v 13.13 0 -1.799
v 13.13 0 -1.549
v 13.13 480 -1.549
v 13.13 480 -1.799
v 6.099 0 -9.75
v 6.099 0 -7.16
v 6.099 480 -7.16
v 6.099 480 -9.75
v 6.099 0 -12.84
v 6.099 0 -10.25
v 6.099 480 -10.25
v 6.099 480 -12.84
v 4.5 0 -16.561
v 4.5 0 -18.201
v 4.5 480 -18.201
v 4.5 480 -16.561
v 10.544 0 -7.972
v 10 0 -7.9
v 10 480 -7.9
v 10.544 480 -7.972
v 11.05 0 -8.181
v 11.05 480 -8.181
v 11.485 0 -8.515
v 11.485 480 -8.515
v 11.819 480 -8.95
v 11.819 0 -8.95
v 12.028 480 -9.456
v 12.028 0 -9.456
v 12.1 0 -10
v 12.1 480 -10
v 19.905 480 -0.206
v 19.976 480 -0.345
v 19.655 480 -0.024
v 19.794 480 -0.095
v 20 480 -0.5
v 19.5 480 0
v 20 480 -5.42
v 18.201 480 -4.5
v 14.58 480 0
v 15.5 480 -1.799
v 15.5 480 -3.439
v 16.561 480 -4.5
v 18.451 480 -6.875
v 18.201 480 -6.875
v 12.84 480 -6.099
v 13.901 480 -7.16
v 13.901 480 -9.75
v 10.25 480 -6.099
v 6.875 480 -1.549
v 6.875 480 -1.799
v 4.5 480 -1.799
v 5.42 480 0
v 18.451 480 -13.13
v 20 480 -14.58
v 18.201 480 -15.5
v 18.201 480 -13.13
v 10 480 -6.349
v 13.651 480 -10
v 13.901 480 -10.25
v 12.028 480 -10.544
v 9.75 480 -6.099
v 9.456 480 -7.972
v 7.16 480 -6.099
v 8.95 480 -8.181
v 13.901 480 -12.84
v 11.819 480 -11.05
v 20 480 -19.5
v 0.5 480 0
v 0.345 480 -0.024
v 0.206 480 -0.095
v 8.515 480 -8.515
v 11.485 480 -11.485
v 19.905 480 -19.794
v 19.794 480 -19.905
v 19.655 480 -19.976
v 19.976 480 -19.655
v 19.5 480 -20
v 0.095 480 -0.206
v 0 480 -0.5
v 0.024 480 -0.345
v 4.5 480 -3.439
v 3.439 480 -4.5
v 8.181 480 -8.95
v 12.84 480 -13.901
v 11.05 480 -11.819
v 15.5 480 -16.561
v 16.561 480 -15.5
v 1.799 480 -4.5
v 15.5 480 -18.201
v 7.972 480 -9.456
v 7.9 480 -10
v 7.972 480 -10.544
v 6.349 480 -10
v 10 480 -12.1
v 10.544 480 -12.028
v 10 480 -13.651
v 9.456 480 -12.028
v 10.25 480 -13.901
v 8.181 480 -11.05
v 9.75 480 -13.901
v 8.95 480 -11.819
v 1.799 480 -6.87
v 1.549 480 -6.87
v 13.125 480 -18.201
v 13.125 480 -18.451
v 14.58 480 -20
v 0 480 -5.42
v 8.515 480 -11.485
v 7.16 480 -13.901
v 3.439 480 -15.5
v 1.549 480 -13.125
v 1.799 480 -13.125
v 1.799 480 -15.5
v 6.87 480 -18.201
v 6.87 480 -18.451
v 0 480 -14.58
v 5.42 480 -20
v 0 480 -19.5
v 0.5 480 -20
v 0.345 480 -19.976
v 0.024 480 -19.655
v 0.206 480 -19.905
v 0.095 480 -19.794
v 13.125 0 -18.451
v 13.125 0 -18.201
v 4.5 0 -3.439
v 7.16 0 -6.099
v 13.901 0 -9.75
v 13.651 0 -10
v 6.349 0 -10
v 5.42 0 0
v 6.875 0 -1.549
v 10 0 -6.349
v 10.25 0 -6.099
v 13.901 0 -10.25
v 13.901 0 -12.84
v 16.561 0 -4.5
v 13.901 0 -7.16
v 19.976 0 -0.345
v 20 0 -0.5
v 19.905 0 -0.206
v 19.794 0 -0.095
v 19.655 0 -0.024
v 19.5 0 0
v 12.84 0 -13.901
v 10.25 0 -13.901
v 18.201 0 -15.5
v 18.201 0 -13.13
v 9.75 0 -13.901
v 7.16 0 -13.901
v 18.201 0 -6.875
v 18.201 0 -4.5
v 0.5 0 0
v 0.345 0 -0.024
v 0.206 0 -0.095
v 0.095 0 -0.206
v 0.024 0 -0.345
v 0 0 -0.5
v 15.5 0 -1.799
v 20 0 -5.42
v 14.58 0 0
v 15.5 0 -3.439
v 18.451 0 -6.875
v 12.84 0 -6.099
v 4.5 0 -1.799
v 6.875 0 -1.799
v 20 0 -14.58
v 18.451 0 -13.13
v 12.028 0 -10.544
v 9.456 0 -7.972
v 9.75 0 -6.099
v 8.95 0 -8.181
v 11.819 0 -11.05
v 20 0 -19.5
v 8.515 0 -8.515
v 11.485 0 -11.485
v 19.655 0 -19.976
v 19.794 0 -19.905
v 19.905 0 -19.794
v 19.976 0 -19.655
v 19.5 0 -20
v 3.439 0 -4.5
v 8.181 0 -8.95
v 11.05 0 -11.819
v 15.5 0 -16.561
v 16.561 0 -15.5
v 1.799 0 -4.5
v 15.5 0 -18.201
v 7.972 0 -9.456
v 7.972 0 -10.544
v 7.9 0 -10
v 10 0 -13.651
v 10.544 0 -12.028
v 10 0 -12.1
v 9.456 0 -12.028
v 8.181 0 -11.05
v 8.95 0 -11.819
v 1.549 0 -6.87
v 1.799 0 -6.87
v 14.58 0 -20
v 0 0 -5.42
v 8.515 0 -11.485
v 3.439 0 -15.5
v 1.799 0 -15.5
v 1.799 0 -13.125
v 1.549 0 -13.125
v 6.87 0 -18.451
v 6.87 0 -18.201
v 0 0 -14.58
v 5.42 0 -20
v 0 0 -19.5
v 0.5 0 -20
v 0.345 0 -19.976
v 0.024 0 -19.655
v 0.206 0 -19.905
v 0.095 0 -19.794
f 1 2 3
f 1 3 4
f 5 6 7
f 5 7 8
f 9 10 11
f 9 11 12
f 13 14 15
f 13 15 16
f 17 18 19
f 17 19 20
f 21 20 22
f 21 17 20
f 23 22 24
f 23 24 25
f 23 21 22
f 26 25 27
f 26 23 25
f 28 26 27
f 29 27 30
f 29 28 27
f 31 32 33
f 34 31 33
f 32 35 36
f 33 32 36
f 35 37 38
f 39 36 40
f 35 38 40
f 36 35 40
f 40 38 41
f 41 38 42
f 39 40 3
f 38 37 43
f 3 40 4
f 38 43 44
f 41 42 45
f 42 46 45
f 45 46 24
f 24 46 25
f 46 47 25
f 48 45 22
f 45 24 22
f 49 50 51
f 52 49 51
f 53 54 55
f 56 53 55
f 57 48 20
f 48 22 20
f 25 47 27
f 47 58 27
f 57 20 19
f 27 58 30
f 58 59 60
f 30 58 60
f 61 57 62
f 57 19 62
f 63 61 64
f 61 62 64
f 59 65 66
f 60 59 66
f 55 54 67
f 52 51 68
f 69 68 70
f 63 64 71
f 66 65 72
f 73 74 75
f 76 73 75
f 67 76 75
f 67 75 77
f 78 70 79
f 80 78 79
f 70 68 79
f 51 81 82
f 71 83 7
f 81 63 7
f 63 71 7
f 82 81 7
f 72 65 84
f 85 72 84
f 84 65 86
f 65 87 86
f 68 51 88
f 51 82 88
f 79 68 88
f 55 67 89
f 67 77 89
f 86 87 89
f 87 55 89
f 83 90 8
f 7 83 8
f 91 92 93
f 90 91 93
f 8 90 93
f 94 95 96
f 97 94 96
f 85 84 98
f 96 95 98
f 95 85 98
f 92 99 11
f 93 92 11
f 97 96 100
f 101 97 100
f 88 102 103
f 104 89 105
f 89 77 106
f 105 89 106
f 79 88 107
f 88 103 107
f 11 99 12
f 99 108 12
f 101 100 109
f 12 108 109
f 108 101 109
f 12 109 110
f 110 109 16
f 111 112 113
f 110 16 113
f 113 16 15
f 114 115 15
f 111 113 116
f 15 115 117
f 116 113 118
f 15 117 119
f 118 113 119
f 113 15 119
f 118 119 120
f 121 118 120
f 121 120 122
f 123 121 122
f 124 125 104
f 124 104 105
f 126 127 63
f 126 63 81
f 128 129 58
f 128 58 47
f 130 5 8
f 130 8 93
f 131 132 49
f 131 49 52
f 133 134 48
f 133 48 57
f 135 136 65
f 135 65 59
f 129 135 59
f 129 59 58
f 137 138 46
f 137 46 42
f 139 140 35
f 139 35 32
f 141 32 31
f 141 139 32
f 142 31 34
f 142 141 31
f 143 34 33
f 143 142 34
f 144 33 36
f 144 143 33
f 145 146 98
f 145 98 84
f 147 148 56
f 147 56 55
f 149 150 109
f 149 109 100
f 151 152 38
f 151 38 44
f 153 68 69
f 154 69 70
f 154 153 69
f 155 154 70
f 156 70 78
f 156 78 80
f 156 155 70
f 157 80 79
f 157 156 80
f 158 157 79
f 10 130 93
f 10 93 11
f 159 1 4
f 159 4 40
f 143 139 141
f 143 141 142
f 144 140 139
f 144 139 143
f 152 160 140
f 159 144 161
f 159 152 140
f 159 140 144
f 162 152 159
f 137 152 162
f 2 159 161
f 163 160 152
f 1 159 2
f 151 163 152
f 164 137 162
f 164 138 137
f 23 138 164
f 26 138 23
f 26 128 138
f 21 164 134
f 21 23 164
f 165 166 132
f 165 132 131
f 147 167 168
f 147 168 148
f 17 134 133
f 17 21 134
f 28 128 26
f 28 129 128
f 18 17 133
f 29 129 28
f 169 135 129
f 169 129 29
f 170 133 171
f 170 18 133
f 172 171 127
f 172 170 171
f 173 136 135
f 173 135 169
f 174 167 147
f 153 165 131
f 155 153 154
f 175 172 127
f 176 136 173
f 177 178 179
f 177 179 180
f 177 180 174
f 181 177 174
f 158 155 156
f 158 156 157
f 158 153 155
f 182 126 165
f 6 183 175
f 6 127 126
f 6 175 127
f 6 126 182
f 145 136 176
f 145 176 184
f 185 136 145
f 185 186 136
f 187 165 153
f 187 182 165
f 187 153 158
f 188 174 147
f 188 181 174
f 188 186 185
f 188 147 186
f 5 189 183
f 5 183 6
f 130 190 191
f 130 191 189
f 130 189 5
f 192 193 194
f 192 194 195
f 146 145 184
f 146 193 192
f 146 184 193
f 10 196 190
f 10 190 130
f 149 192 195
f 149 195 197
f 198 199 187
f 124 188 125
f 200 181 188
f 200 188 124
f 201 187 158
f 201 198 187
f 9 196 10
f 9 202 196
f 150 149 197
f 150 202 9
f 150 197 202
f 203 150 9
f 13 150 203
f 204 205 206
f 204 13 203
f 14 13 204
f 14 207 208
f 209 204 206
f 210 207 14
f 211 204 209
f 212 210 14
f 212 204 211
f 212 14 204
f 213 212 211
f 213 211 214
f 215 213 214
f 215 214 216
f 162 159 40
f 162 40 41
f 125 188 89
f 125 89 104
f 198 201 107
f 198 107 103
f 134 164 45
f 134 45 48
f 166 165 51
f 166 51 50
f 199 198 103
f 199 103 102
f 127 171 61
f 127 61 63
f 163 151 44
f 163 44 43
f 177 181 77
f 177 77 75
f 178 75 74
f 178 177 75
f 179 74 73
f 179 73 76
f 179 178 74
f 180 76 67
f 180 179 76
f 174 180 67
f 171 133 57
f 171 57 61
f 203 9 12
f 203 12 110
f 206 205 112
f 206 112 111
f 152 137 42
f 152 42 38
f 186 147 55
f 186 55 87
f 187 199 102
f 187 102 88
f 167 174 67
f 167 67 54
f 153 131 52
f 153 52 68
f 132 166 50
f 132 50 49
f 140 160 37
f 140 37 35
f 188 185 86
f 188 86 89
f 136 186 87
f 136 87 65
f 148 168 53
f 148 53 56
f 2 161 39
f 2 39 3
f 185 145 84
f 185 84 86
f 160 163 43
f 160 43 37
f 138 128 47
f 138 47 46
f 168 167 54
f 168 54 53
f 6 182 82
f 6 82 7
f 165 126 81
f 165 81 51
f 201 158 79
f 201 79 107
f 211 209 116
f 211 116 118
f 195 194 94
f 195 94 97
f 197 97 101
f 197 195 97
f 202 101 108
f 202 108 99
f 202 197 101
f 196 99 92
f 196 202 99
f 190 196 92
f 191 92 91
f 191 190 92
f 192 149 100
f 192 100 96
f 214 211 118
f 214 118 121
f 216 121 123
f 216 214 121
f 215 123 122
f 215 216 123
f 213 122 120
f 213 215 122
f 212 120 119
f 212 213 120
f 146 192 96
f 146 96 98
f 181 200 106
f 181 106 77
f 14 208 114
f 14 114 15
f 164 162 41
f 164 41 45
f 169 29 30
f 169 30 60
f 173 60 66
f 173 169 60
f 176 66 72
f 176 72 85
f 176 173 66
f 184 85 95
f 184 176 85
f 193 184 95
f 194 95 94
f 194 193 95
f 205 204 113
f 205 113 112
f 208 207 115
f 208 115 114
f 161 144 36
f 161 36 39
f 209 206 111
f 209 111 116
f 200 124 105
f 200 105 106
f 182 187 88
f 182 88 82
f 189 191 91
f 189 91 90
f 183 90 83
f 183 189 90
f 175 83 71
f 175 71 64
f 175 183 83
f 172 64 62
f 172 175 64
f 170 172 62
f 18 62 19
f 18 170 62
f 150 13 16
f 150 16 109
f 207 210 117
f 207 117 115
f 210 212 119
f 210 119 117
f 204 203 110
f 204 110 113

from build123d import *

# Parameters (mm, degrees)
BOSS_EXTRUDE1_DEPTH = 480


with BuildPart() as part:
    # Sketch1 → Boss-Extrude1 (new body)
    with BuildSketch(Plane(origin=(0, 0, 0), x_dir=(1, 0, 0), z_dir=(0, 1, 0))):
        with BuildLine():
            Line((20, 5.42), (20, 0.5))
            ThreePointArc((20, 0.5), (19.853553391, 0.146446609), (19.5, 0))
            Line((19.5, 0), (14.58, 0))
            Line((14.58, 0), (13.13, 1.549339828))
            Line((13.13, 1.549339828), (13.13, 1.799339828))
            Line((13.13, 1.799339828), (15.5, 1.799339828))
            Line((15.5, 1.799339828), (15.5, 3.439339828))
            Line((15.5, 3.439339828), (12.84, 6.099339828))
            Line((12.84, 6.099339828), (10.25, 6.099339828))
            Line((10.25, 6.099339828), (10, 6.349339828))
            Line((10, 6.349339828), (9.75, 6.099339828))
            Line((9.75, 6.099339828), (7.16, 6.099339828))
            Line((7.16, 6.099339828), (4.5, 3.439339828))
            Line((4.5, 3.439339828), (4.5, 1.799339828))
            Line((4.5, 1.799339828), (6.875, 1.799339828))
            Line((6.875, 1.799339828), (6.875, 1.549339828))
            Line((6.875, 1.549339828), (5.42, 0))
            Line((5.42, 0), (0.5, 0))
            ThreePointArc((0.5, 0), (0.146446609, 0.146446609), (0, 0.5))
            Line((0, 0.5), (0, 5.42))
            Line((0, 5.42), (1.549339828, 6.87))
            Line((1.549339828, 6.87), (1.799339828, 6.87))
            Line((1.799339828, 6.87), (1.799339828, 4.5))
            Line((1.799339828, 4.5), (3.439339828, 4.5))
            Line((3.439339828, 4.5), (6.099339828, 7.16))
            Line((6.099339828, 7.16), (6.099339828, 9.75))
            Line((6.099339828, 9.75), (6.349339828, 10))
            Line((6.349339828, 10), (6.099339828, 10.25))
            Line((6.099339828, 10.25), (6.099339828, 12.84))
            Line((6.099339828, 12.84), (3.439339828, 15.5))
            Line((3.439339828, 15.5), (1.799339828, 15.5))
            Line((1.799339828, 15.5), (1.799339828, 13.125))
            Line((1.799339828, 13.125), (1.549339828, 13.125))
            Line((1.549339828, 13.125), (0, 14.58))
            Line((0, 14.58), (0, 19.5))
            ThreePointArc((0, 19.5), (0.146446609, 19.853553391), (0.5, 20))
            Line((0.5, 20), (5.42, 20))
            Line((5.42, 20), (6.87, 18.450660172))
            Line((6.87, 18.450660172), (6.87, 18.200660172))
            Line((6.87, 18.200660172), (4.5, 18.200660172))
            Line((4.5, 18.200660172), (4.5, 16.560660172))
            Line((4.5, 16.560660172), (7.16, 13.900660172))
            Line((7.16, 13.900660172), (9.75, 13.900660172))
            Line((9.75, 13.900660172), (10, 13.650660172))
            Line((10, 13.650660172), (10.25, 13.900660172))
            Line((10.25, 13.900660172), (12.84, 13.900660172))
            Line((12.84, 13.900660172), (15.5, 16.560660172))
            Line((15.5, 16.560660172), (15.5, 18.200660172))
            Line((15.5, 18.200660172), (13.125, 18.200660172))
            Line((13.125, 18.200660172), (13.125, 18.450660172))
            Line((13.125, 18.450660172), (14.58, 20))
            Line((14.58, 20), (19.5, 20))
            ThreePointArc((19.5, 20), (19.853553391, 19.853553391), (20, 19.5))
            Line((20, 19.5), (20, 14.58))
            Line((20, 14.58), (18.450660172, 13.13))
            Line((18.450660172, 13.13), (18.200660172, 13.13))
            Line((18.200660172, 13.13), (18.200660172, 15.5))
            Line((18.200660172, 15.5), (16.560660172, 15.5))
            Line((16.560660172, 15.5), (13.900660172, 12.84))
            Line((13.900660172, 12.84), (13.900660172, 10.25))
            Line((13.900660172, 10.25), (13.650660172, 10))
            Line((13.650660172, 10), (13.900660172, 9.75))
            Line((13.900660172, 9.75), (13.900660172, 7.16))
            Line((13.900660172, 7.16), (16.560660172, 4.5))
            Line((16.560660172, 4.5), (18.200660172, 4.5))
            Line((18.200660172, 4.5), (18.200660172, 6.875))
            Line((18.200660172, 6.875), (18.450660172, 6.875))
            Line((18.450660172, 6.875), (20, 5.42))
        make_face()
        with BuildLine():
            ThreePointArc((12.1, 10), (11.48492424, 11.48492424), (10, 12.1))
            ThreePointArc((10, 12.1), (8.51507576, 11.48492424), (7.9, 10))
            ThreePointArc((7.9, 10), (8.51507576, 8.51507576), (10, 7.9))
            ThreePointArc((10, 7.9), (11.48492424, 8.51507576), (12.1, 10))
        make_face(mode=Mode.SUBTRACT)
    extrude(amount=BOSS_EXTRUDE1_DEPTH)


solid = part.part
